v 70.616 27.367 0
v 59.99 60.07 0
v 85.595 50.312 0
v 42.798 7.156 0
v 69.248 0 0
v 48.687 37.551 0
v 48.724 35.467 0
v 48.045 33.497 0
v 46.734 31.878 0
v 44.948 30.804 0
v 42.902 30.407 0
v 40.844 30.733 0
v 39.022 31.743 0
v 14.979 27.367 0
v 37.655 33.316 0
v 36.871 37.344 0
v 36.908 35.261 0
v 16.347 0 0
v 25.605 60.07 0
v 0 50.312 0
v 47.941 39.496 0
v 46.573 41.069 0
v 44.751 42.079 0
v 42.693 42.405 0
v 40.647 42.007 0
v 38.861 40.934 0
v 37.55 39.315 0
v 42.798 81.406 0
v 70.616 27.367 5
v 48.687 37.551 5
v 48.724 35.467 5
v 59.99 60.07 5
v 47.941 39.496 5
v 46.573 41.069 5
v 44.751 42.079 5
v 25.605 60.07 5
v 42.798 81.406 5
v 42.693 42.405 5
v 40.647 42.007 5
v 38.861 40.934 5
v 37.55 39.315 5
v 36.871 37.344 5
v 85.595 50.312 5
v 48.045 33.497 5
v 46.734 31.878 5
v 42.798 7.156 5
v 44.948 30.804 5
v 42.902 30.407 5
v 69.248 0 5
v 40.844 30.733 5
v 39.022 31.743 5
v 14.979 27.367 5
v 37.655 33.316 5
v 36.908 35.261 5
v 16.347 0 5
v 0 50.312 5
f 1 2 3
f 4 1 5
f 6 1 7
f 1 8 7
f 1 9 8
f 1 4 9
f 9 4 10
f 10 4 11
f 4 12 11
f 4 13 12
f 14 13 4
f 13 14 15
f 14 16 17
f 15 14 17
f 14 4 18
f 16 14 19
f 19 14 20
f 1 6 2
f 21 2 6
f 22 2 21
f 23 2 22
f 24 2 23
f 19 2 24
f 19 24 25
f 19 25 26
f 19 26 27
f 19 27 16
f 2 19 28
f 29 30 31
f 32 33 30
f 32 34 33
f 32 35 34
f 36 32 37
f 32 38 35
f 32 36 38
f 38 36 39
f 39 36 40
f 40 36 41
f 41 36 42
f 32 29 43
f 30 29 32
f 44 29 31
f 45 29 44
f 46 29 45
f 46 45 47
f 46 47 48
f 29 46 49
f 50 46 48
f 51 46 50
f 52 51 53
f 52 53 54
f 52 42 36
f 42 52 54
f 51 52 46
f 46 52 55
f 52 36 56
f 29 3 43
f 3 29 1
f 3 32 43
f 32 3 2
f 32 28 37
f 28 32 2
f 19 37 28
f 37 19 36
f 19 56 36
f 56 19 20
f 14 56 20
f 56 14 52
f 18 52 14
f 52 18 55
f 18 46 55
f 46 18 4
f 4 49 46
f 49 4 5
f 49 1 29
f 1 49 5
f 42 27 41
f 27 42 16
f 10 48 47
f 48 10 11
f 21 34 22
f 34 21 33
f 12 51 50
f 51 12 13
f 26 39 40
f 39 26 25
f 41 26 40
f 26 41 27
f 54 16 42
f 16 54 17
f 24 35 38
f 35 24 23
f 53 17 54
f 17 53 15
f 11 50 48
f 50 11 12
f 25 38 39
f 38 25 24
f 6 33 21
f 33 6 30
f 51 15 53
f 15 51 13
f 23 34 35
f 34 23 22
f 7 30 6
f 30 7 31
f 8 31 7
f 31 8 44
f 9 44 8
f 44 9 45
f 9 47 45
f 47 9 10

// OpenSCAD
$fn = 32;

// ----------------------------------------------------------------------
// Star wheel: 5-point blunt, R45
// ----------------------------------------------------------------------

// --- parameters (mm) ---
n_points = 5;             // number of points / teeth
r_out = 45;               // tip radius
r_in = 29.25;             // root radius
bore_r = 6;               // centre bore radius
plate_t = 5;              // plate thickness, Z (extrusion height)
bore_d = 12;              // centre bore diameter

profile = [[42.798, 81.406], [25.605, 60.07], [0, 50.312], [14.979, 27.367], [16.347, 0], [42.798, 7.156], [69.248, 0], [70.616, 27.367], [85.595, 50.312], [59.99, 60.07]];  // primary outline, 10 points, counter clockwise
void_1 = [[48.687, 37.551], [47.941, 39.496], [46.573, 41.069], [44.751, 42.079], [42.693, 42.405], [40.647, 42.007], [38.861, 40.934], [37.55, 39.315], [36.871, 37.344], [36.908, 35.261], [37.655, 33.316], [39.022, 31.743], [40.844, 30.733], [42.902, 30.407], [44.948, 30.804], [46.734, 31.878], [48.045, 33.497], [48.724, 35.467]];  // centre bore, 18 points

// --- the one profile operation ---
difference() {
  linear_extrude(height = plate_t) polygon(points = profile);
  translate([0, 0, -1])
    linear_extrude(height = plate_t + 2) polygon(points = void_1);
}
